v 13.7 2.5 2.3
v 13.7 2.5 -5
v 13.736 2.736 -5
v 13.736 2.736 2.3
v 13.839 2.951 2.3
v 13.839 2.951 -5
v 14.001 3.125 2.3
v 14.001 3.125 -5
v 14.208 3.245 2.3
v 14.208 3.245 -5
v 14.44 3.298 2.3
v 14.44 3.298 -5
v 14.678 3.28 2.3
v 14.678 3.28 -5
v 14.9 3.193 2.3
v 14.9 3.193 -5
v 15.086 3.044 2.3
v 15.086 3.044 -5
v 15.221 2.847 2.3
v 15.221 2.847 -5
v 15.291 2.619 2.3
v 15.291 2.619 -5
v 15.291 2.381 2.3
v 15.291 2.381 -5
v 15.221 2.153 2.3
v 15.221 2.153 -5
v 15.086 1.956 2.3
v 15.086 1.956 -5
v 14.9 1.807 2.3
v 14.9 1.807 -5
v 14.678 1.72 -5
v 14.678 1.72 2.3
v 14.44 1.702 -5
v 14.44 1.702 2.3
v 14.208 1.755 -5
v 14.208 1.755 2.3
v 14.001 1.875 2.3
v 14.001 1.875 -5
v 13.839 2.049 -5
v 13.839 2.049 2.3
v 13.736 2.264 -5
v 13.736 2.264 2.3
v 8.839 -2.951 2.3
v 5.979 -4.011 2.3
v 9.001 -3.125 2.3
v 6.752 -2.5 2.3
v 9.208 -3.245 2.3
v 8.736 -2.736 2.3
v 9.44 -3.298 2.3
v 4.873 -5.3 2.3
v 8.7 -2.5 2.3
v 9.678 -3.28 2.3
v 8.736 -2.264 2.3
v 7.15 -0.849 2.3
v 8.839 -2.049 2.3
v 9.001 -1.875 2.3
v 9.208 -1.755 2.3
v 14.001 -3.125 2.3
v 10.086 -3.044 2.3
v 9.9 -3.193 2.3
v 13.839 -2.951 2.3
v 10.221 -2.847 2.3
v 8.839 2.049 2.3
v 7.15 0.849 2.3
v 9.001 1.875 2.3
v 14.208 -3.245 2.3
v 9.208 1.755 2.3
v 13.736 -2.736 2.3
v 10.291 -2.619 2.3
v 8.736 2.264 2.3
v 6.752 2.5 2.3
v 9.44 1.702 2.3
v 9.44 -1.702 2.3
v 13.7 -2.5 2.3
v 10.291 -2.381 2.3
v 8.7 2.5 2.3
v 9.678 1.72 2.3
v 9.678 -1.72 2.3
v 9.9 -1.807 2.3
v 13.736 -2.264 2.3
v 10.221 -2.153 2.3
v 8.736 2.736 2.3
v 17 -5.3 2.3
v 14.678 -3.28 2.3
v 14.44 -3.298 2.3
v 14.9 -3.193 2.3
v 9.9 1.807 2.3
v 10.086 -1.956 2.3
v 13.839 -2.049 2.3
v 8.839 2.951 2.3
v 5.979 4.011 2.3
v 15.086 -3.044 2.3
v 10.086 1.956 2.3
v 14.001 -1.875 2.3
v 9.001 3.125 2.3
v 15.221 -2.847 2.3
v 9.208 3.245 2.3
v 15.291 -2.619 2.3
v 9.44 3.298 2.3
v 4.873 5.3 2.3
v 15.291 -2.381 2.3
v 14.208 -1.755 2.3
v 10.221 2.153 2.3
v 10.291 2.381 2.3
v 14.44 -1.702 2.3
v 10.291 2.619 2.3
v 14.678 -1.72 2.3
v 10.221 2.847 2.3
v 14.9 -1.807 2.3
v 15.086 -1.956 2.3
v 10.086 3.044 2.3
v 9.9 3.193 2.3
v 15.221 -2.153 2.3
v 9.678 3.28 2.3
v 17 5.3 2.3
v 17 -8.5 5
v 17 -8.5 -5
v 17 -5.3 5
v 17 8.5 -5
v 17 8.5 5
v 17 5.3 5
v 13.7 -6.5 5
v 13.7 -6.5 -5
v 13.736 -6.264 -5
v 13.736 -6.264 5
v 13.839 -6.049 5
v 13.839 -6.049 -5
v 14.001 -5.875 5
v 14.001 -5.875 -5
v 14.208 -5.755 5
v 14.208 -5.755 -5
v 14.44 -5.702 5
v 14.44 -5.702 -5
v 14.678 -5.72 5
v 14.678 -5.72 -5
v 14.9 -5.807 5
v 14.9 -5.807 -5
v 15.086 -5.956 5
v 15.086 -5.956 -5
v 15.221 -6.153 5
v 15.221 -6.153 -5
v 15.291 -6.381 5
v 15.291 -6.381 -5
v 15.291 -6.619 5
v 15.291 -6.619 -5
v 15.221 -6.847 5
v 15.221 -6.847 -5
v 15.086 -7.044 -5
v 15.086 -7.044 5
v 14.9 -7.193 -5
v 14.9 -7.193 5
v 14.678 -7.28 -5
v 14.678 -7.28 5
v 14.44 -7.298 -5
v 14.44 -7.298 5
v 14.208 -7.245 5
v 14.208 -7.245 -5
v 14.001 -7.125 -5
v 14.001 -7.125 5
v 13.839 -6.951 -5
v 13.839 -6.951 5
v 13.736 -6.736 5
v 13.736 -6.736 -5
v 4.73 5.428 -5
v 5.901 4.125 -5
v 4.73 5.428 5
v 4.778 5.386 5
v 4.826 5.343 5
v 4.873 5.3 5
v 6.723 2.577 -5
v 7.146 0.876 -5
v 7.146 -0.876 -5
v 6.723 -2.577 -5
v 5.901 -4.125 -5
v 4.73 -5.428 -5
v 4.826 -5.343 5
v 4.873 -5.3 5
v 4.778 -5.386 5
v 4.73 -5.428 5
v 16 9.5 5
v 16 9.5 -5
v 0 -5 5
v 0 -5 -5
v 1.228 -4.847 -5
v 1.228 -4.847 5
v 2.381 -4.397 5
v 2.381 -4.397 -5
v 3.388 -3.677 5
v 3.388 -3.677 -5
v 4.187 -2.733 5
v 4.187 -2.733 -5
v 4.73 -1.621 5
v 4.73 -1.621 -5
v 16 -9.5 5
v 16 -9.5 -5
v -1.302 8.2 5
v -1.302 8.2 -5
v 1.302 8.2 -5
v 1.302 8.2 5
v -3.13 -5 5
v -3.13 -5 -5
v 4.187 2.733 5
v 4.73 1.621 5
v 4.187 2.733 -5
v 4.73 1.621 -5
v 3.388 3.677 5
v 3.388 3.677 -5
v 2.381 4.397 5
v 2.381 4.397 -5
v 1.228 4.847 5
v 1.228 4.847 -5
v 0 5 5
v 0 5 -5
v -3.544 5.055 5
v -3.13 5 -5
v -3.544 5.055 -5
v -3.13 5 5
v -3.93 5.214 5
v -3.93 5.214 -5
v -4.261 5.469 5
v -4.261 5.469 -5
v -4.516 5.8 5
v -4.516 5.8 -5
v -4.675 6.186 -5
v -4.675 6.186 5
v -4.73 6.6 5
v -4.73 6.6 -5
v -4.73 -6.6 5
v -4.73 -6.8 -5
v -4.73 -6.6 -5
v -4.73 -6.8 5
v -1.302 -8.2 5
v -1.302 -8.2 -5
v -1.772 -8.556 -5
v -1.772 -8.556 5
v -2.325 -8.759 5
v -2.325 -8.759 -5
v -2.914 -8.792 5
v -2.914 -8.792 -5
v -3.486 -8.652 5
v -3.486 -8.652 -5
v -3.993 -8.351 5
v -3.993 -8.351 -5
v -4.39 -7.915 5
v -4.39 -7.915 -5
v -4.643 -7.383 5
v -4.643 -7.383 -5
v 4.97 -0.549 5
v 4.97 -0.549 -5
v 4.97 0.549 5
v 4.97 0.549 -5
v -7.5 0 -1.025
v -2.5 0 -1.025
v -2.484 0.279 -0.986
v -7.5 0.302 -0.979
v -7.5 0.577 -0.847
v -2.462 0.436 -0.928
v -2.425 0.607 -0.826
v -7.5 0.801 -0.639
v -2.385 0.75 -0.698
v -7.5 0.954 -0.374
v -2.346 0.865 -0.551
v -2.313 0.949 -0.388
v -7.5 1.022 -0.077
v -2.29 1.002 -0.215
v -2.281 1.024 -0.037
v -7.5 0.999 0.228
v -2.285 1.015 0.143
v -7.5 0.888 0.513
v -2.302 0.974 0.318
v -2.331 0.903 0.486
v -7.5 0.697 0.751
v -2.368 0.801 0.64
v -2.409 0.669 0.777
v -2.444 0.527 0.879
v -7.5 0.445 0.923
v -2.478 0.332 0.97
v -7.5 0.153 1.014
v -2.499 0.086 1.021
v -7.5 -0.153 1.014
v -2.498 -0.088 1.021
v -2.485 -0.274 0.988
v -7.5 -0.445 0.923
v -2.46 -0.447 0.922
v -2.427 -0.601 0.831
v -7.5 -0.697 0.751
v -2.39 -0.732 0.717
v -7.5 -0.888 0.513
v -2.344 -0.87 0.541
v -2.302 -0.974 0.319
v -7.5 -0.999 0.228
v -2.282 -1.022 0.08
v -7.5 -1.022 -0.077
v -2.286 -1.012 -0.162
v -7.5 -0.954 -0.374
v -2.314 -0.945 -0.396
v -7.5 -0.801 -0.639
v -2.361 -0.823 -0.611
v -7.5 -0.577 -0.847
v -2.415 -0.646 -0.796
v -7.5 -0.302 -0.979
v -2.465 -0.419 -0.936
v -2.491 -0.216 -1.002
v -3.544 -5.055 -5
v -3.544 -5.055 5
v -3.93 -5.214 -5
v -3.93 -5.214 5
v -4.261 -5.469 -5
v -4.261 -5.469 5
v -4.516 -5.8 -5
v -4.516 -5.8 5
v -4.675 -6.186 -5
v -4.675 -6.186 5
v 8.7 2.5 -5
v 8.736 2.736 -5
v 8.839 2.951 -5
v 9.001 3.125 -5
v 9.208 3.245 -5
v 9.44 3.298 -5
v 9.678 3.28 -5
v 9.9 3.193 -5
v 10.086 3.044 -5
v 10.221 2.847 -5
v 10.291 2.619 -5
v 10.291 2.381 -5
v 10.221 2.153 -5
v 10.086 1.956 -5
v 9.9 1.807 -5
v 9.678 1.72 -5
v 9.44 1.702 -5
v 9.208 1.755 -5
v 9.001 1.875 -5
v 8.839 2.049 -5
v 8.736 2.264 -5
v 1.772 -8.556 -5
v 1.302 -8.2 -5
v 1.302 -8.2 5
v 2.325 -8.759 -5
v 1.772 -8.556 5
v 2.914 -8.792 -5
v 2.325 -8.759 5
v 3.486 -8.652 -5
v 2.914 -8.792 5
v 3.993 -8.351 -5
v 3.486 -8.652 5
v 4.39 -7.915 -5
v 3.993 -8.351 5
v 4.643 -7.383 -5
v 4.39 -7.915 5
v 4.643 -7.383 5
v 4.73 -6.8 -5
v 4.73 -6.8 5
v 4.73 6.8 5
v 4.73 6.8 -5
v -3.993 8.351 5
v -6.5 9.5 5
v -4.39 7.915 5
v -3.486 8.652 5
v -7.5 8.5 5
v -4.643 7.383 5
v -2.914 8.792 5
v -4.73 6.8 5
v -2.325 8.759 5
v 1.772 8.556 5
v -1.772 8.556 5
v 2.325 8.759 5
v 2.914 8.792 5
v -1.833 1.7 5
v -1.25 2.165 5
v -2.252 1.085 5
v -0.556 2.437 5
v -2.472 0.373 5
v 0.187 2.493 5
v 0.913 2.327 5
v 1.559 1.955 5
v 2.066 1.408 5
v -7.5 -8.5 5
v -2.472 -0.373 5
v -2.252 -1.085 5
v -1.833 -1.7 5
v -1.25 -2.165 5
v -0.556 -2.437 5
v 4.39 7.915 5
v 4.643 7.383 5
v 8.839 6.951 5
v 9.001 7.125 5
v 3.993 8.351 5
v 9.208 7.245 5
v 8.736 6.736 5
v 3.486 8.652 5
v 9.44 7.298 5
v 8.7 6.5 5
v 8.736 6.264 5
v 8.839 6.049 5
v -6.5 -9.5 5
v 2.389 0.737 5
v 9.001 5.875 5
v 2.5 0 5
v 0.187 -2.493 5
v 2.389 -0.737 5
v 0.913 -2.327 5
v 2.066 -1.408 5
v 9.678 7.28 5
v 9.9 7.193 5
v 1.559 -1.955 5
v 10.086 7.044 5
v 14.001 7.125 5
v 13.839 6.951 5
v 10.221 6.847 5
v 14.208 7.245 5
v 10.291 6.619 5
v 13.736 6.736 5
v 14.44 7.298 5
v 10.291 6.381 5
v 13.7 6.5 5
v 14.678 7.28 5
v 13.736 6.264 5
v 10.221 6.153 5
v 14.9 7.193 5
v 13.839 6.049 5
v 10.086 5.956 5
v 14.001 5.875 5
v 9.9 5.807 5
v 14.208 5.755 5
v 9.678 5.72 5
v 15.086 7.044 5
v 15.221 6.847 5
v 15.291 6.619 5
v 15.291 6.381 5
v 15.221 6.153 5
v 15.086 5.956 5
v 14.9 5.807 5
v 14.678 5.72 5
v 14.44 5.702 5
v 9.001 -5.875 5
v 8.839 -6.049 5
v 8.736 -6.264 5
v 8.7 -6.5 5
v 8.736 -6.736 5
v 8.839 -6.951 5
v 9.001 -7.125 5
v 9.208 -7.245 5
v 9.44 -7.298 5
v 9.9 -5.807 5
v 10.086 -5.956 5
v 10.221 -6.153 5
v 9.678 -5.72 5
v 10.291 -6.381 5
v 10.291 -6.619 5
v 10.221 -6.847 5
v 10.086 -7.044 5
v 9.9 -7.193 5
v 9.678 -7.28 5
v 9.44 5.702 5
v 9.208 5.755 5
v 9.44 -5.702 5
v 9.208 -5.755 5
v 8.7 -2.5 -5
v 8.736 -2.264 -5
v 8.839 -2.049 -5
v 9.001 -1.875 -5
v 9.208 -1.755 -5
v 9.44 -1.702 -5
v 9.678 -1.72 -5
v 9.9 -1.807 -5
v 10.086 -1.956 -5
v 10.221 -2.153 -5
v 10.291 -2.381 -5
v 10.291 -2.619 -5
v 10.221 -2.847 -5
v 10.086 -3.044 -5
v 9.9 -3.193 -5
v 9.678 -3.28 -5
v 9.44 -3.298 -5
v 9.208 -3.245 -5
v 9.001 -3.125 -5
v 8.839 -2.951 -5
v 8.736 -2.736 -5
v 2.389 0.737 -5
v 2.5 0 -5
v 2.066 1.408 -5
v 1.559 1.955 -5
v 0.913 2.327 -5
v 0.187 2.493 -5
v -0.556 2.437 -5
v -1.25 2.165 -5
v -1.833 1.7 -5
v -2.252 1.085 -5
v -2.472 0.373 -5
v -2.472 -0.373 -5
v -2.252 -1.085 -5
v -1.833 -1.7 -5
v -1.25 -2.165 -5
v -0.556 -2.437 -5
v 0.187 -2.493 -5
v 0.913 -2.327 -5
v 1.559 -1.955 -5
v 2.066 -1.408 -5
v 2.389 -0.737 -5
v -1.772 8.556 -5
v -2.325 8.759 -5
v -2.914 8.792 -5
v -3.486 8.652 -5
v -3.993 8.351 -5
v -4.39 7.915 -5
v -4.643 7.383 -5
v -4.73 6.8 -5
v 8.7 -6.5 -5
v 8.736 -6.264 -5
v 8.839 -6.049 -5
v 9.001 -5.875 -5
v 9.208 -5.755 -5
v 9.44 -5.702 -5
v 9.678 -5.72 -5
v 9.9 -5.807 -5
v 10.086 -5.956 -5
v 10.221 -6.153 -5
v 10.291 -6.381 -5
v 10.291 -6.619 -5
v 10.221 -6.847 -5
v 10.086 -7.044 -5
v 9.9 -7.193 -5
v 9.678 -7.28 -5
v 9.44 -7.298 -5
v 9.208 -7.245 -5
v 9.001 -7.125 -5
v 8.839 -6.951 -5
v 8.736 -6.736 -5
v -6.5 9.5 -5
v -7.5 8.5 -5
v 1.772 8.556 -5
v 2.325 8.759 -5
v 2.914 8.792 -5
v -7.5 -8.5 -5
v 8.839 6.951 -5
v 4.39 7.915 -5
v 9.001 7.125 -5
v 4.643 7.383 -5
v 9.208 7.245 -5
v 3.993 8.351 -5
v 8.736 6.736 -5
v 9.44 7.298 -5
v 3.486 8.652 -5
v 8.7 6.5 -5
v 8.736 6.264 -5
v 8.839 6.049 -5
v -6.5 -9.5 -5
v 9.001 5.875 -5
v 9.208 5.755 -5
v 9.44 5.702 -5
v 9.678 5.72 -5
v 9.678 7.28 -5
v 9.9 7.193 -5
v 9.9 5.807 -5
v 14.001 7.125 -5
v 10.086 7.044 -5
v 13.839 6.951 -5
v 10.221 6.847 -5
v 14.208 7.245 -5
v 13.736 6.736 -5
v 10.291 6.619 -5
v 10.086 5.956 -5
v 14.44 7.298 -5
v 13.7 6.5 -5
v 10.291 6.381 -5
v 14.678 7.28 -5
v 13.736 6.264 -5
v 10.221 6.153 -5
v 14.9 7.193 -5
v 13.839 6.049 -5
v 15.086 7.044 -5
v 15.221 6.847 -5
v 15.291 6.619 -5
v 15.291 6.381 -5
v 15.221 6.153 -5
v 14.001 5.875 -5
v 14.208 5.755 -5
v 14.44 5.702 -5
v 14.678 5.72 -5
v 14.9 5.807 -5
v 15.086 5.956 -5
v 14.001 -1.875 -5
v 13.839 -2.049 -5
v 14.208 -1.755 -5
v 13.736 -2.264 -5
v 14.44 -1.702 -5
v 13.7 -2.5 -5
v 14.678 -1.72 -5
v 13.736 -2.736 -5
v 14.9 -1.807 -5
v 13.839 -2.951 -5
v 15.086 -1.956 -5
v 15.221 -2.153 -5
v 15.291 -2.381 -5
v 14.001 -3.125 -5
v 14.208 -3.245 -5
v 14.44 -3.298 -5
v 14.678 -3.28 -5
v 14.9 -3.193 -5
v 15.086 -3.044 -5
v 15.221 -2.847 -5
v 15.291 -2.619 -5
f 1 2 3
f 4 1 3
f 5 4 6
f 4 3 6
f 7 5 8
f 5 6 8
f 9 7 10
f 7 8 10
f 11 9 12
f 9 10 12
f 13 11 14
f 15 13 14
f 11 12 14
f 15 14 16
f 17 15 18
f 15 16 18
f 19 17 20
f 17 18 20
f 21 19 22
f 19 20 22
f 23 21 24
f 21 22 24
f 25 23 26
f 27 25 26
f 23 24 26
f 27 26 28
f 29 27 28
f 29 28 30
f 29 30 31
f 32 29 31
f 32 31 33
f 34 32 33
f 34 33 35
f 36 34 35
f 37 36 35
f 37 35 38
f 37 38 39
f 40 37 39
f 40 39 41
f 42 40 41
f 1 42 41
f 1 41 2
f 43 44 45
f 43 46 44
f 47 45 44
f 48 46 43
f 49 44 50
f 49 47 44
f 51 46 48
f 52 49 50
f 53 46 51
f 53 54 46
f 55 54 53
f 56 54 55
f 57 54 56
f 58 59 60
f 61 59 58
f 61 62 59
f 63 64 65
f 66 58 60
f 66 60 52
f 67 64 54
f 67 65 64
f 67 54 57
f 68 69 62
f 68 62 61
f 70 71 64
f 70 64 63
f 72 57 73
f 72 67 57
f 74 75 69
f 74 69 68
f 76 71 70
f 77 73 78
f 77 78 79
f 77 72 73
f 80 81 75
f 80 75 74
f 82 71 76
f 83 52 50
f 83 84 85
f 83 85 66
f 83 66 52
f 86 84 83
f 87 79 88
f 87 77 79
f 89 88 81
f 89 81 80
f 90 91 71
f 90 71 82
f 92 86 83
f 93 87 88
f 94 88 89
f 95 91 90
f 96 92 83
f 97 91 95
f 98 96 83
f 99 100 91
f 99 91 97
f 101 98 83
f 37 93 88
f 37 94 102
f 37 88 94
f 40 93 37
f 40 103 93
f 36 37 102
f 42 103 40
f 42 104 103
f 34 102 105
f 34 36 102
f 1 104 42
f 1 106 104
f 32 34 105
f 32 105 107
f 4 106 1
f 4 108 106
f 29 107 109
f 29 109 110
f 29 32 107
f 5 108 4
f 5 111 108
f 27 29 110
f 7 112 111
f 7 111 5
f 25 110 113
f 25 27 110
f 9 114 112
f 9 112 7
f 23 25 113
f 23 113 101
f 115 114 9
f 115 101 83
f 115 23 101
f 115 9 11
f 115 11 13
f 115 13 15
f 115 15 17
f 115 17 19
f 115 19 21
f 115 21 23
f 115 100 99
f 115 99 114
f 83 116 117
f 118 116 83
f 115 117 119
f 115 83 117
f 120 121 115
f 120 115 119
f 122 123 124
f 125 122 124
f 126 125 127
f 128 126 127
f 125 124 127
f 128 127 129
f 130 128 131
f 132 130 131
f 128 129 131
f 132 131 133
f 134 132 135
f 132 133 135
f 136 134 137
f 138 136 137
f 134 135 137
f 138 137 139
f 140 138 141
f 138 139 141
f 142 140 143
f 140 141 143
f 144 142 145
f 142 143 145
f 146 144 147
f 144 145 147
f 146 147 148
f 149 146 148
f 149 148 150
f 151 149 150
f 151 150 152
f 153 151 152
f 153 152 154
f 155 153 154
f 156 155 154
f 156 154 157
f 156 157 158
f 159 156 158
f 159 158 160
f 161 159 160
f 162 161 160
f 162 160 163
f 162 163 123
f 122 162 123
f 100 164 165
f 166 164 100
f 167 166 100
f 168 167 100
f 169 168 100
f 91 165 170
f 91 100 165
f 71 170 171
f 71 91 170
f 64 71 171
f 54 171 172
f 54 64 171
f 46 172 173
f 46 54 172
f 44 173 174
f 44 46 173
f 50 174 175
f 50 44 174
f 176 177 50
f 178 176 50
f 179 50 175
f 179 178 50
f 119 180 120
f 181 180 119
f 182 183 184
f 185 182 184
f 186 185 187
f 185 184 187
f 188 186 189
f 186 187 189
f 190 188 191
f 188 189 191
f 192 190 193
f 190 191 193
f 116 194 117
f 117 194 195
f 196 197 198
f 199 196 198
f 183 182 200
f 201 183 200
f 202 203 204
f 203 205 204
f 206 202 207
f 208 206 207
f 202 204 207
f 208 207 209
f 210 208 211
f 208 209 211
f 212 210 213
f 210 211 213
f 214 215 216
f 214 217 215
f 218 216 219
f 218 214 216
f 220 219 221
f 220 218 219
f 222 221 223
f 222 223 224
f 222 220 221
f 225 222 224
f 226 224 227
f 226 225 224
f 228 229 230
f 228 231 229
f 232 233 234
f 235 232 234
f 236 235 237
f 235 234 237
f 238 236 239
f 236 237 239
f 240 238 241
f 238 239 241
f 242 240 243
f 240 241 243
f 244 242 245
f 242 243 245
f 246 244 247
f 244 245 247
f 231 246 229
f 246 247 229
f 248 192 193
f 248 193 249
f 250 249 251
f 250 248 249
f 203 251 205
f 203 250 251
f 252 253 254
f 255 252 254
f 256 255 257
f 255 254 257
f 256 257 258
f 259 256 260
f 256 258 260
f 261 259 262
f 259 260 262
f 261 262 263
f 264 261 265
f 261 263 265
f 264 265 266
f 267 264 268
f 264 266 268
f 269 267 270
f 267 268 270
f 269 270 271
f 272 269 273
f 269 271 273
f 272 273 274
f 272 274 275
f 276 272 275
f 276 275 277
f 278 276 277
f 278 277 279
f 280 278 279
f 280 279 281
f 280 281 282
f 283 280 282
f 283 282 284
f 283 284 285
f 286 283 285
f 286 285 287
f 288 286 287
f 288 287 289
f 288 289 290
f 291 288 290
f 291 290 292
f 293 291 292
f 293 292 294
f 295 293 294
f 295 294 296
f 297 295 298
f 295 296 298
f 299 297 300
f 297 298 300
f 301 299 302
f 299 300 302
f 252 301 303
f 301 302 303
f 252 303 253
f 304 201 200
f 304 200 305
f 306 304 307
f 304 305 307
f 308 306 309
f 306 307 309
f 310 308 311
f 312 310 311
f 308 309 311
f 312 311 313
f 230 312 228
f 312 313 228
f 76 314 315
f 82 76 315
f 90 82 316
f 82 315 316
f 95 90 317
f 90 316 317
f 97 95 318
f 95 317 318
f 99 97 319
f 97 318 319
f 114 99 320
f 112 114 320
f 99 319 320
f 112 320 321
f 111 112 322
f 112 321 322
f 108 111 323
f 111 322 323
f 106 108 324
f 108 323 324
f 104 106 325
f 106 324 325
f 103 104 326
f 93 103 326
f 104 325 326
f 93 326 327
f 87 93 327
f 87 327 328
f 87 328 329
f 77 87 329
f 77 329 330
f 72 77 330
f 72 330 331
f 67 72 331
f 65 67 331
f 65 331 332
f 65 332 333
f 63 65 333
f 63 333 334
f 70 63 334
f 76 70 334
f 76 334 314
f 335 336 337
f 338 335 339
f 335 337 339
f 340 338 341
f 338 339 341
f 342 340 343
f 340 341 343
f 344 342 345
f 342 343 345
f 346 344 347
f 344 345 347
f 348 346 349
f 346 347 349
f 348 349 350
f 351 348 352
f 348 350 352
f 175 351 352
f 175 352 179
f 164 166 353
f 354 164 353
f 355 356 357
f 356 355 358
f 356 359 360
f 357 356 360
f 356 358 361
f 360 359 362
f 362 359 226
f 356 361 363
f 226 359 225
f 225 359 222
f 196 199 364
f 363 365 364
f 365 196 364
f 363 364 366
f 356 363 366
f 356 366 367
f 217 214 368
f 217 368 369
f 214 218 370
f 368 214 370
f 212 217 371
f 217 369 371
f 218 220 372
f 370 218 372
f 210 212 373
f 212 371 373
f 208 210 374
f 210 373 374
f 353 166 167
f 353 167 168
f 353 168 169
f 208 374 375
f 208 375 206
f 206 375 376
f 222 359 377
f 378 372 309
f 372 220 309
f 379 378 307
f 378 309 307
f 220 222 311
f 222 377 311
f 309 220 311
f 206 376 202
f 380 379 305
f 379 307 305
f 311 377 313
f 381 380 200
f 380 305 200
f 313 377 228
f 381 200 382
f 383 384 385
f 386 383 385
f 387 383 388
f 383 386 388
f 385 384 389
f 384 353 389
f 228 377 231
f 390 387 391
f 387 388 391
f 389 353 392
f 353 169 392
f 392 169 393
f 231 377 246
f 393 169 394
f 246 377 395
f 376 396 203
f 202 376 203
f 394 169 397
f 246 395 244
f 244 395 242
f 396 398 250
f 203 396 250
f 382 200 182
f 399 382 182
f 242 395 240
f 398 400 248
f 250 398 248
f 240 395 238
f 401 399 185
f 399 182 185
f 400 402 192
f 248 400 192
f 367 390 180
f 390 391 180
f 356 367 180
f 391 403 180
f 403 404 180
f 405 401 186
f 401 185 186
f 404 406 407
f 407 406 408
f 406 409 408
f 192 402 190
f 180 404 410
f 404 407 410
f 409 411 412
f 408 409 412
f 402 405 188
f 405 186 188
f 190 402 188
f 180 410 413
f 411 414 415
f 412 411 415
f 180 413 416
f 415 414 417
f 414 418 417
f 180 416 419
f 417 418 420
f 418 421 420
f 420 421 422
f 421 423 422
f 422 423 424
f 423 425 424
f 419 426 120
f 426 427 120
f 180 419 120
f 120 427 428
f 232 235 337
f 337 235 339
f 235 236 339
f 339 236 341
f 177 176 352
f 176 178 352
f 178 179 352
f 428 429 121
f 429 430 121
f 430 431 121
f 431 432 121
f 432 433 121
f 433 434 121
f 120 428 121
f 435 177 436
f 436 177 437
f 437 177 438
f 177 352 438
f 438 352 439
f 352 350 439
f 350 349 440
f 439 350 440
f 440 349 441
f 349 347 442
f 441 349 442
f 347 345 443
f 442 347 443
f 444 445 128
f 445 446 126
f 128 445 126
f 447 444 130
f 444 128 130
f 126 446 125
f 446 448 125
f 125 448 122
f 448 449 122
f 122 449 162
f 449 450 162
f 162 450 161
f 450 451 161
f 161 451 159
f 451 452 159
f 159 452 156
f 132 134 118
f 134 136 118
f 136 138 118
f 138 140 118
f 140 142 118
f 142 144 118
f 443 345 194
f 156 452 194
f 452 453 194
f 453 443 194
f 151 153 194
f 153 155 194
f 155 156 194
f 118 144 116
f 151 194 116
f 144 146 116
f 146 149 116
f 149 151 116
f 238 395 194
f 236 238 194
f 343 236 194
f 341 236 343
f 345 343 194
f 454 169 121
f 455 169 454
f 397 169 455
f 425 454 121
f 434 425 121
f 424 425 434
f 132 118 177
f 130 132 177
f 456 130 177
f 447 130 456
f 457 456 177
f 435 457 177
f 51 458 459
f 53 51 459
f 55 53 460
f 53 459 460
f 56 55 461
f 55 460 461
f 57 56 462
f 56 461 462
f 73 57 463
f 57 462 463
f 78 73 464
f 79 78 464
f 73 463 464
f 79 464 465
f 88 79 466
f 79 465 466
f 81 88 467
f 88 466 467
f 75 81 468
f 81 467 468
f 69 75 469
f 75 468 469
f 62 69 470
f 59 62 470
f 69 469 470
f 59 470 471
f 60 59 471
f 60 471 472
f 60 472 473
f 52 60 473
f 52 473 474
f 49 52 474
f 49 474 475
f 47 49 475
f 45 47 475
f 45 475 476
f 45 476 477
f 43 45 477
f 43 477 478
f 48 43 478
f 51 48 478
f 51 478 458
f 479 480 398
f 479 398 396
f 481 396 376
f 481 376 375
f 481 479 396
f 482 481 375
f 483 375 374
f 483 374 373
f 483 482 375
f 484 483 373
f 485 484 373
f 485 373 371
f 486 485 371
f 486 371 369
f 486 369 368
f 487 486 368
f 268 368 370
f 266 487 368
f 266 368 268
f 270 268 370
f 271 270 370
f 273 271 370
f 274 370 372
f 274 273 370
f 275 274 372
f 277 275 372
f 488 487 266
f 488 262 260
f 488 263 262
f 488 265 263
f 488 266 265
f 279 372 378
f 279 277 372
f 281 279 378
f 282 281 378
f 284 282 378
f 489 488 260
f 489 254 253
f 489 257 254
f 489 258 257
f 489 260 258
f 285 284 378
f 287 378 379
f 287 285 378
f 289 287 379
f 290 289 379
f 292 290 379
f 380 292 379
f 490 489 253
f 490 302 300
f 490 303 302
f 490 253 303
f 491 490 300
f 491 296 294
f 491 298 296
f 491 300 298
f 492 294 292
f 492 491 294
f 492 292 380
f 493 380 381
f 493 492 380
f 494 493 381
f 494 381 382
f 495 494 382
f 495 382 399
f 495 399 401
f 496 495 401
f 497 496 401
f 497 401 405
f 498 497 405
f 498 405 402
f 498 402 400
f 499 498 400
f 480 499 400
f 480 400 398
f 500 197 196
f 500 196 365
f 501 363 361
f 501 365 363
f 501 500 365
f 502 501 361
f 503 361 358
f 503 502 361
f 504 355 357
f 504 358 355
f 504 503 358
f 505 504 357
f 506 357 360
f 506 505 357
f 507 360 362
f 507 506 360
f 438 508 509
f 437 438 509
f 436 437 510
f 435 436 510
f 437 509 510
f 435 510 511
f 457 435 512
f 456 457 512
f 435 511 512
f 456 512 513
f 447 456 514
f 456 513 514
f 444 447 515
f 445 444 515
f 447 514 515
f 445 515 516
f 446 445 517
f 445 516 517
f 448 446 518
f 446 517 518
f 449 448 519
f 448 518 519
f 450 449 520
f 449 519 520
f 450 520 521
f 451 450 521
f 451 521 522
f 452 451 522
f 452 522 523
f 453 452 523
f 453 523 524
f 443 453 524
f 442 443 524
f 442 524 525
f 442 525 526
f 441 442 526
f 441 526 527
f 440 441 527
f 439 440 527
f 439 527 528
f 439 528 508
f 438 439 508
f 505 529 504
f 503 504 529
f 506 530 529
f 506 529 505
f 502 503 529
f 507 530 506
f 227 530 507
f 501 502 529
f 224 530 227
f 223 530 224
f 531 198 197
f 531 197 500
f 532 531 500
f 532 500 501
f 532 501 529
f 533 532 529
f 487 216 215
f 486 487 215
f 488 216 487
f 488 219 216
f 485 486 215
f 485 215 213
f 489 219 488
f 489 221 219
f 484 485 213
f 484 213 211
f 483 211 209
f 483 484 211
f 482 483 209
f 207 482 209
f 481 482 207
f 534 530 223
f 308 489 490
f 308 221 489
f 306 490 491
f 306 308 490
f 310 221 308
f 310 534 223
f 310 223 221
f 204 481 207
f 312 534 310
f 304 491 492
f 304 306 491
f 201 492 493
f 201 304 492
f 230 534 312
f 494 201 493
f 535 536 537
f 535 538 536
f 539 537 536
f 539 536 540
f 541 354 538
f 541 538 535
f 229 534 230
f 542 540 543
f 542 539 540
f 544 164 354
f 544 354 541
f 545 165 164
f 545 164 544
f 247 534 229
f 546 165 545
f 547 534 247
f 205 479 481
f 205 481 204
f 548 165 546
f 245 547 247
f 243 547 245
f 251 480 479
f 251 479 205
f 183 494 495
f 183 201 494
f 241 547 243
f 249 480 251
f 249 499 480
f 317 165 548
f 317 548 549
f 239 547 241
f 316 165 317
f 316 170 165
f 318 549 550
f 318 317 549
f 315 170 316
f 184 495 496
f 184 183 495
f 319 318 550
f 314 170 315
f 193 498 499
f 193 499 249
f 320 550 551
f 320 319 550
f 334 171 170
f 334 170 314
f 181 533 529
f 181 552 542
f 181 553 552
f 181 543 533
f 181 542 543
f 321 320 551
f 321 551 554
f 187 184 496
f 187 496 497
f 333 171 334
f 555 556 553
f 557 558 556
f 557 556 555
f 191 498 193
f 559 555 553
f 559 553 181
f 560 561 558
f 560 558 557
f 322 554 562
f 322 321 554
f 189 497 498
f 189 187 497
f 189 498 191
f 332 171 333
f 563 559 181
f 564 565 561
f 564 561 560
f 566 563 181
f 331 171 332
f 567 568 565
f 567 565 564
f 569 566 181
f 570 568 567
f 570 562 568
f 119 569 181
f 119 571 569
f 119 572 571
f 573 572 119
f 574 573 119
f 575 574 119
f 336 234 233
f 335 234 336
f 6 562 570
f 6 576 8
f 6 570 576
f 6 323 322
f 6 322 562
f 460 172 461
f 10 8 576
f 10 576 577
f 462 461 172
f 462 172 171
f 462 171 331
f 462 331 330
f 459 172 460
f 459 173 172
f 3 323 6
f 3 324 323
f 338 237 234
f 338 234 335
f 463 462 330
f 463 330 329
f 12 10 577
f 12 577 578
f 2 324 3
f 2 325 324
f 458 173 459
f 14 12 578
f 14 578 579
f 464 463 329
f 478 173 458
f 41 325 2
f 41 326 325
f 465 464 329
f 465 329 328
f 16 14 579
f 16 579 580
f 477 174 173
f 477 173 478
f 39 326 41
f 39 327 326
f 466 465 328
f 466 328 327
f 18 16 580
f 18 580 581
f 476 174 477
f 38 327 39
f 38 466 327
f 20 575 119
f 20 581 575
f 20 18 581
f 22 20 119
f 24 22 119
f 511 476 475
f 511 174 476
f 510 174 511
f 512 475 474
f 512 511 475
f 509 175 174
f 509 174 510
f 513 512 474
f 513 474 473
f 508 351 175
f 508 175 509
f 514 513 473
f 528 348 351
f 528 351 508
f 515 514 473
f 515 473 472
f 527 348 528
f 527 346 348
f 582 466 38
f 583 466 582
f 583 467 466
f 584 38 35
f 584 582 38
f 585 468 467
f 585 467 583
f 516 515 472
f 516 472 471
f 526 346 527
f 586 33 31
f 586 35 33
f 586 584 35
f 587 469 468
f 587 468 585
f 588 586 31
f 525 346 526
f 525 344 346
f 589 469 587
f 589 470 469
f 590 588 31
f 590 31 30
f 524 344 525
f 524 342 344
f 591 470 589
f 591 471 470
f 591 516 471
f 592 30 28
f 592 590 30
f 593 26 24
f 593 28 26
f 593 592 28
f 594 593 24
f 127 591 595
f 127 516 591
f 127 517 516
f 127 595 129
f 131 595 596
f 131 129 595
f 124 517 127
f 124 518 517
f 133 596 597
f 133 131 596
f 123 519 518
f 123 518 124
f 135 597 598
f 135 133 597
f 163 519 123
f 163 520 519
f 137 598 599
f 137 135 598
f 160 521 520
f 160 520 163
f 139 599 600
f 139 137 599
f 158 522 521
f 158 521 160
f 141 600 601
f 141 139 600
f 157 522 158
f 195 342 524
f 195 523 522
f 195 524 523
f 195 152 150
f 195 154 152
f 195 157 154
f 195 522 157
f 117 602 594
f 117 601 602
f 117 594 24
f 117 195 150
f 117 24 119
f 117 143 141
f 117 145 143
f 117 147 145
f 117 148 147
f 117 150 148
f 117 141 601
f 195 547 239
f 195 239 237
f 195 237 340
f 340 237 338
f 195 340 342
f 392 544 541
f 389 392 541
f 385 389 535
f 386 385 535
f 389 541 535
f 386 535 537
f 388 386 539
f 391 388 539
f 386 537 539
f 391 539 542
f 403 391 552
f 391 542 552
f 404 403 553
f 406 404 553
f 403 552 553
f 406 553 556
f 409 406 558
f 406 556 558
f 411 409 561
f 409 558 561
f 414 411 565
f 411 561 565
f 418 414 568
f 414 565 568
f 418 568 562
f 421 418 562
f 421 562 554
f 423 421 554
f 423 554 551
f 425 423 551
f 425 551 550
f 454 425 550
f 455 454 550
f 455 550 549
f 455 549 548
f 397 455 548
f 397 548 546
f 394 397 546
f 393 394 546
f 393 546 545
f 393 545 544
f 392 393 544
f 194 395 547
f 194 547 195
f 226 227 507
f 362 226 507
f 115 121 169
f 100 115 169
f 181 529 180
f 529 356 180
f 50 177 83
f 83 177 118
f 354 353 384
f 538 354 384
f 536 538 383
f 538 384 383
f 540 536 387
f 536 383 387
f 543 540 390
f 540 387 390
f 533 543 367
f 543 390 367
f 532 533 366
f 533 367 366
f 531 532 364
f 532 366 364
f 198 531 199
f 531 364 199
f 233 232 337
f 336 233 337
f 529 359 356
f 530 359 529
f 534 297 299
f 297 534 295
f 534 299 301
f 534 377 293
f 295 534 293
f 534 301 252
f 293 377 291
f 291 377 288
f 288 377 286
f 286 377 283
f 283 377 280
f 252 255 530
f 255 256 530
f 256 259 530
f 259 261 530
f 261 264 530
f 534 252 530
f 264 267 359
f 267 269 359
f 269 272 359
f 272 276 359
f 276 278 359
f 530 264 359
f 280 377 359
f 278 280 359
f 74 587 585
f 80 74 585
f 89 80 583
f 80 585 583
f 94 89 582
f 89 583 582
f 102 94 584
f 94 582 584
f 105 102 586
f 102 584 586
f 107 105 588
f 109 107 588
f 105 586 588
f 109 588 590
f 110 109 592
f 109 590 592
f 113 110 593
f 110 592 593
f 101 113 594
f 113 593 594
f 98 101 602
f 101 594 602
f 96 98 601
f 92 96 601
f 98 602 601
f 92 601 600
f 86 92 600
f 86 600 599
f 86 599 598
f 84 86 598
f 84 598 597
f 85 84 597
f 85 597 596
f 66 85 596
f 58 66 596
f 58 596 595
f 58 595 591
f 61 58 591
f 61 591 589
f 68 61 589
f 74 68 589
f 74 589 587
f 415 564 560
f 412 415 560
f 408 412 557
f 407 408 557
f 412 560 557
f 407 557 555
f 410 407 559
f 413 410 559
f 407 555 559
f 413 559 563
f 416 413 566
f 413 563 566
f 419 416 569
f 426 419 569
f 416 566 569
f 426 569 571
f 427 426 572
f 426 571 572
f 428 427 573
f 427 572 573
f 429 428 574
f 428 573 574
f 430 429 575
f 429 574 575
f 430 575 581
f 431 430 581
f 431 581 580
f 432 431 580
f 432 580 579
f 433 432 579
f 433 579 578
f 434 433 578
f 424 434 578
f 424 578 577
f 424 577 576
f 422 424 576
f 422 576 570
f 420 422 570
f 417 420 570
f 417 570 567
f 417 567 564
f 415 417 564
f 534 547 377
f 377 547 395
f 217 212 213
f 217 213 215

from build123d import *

# Parameters (mm, degrees)
SKETCH1_W                = 15
SKETCH1_H                = 19
BOSS_EXTRUDE1_DEPTH      = 5
BOSS_EXTRUDE1_DEPTH_BACK = 5
CUT_EXTRUDE1_START       = -6
SKETCH2_R                = 2
CUT_EXTRUDE1_DEPTH       = 16
SKETCH5_R                = 2
CUT_EXTRUDE4_DEPTH       = 17
CUT_EXTRUDE4_DEPTH_BACK  = 17
SKETCH6_R                = 2
CUT_EXTRUDE5_DEPTH       = 17
CUT_EXTRUDE5_DEPTH_BACK  = 17
SKETCH10_W               = 9.46
SKETCH10_H               = 13.6
CUT_EXTRUDE6_DEPTH       = 6
CUT_EXTRUDE6_DEPTH_BACK  = 6
BOSS_EXTRUDE2_START      = -5
SKETCH7_R                = 5
SKETCH7_R_2              = 2.5
BOSS_EXTRUDE2_DEPTH      = 10
BOSS_EXTRUDE3_DEPTH      = 5
FILLET1_R                = 1.6
SKETCH11_W               = 12.27
SKETCH11_H               = 19
BOSS_EXTRUDE4_DEPTH      = 10
CHAMFER1_SIZE            = 1
SKETCH16_W               = 5.80562201
SKETCH16_H               = 3.2
CUT_EXTRUDE8_DEPTH       = 11.5
CUT_EXTRUDE9_DEPTH       = 11.5
CUT_EXTRUDE10_DEPTH      = 2.7
TROU_TARAUD_M21_D        = 1.6
TROU_TARAUD_M2_51_D      = 2.05
TROU_TARAUD_M2_51_DEPTH  = 8.25
TROU_TARAUD_M2_51_TIP    = 0.615882135


with BuildPart() as part:
    # Sketch1 → Boss-Extrude1 (new body, two sides)
    with BuildSketch(Plane.XY) as boss_extrude1_sk:
        Rectangle(SKETCH1_W, SKETCH1_H)
    extrude(amount=BOSS_EXTRUDE1_DEPTH)
    extrude(boss_extrude1_sk.sketch, amount=-BOSS_EXTRUDE1_DEPTH_BACK)

    # Sketch2 → Cut-Extrude1 (cut)
    with BuildSketch(Plane.XY.offset(CUT_EXTRUDE1_START)):
        with Locations((-2.73, 6.8)):
            Circle(SKETCH2_R)
    cut_extrude1 = extrude(amount=CUT_EXTRUDE1_DEPTH, mode=Mode.SUBTRACT)

    # Mirror3: Cut-Extrude1 across plane
    add(cut_extrude1.mirror(Plane.ZX), mode=Mode.SUBTRACT)

    # Sketch5 → Cut-Extrude4 (cut, two sides)
    with BuildSketch(Plane.XY) as cut_extrude4_sk:
        with Locations((2.73, 6.8)):
            Circle(SKETCH5_R)
    extrude(amount=CUT_EXTRUDE4_DEPTH, mode=Mode.SUBTRACT)
    extrude(cut_extrude4_sk.sketch, amount=-CUT_EXTRUDE4_DEPTH_BACK, mode=Mode.SUBTRACT)

    # Sketch6 → Cut-Extrude5 (cut, two sides)
    with BuildSketch(Plane.XY) as cut_extrude5_sk:
        with Locations((2.73, -6.8)):
            Circle(SKETCH6_R)
    extrude(amount=CUT_EXTRUDE5_DEPTH, mode=Mode.SUBTRACT)
    extrude(cut_extrude5_sk.sketch, amount=-CUT_EXTRUDE5_DEPTH_BACK, mode=Mode.SUBTRACT)

    # Sketch10 → Cut-Extrude6 (cut, two sides)
    with BuildSketch(Plane.XY) as cut_extrude6_sk:
        Rectangle(SKETCH10_W, SKETCH10_H)
    extrude(amount=CUT_EXTRUDE6_DEPTH, mode=Mode.SUBTRACT)
    extrude(cut_extrude6_sk.sketch, amount=-CUT_EXTRUDE6_DEPTH_BACK, mode=Mode.SUBTRACT)



with BuildPart() as body_2:
    # Sketch7 → Boss-Extrude2 (new body)
    with BuildSketch(Plane.XY.offset(BOSS_EXTRUDE2_START)):
        Circle(SKETCH7_R)
        Circle(SKETCH7_R_2, mode=Mode.SUBTRACT)
    extrude(amount=BOSS_EXTRUDE2_DEPTH)


with BuildPart() as part_1:
    add(part.part)

    add(body_2.part)  # Boss-Extrude3 merges body 2
    # Sketch8 → Boss-Extrude3 (add, symmetric)
    with BuildSketch(Plane.XY):
        Polygon((0, 5), (-7.5, 5), (-7.5, 0), (-5, 0), align=None)
    boss_extrude3 = extrude(amount=BOSS_EXTRUDE3_DEPTH, both=True)

    # Mirror7: Boss-Extrude3 across plane
    add(boss_extrude3.mirror(Plane.ZX))

    # Fillet1
    fillet1_edges = [part_1.edges().sort_by_distance(p)[0] for p in [
        (-4.73, -5, 0),
        (-4.73, 5, 0),
    ]]
    fillet(fillet1_edges, radius=FILLET1_R)

    # Sketch11 → Boss-Extrude4 (add)
    with BuildSketch(Plane.XY.offset(5)):
        with Locations((10.865, 0)):
            Rectangle(SKETCH11_W, SKETCH11_H)
    extrude(amount=-BOSS_EXTRUDE4_DEPTH)

    # Chamfer1
    chamfer1_edges = [part_1.edges().sort_by_distance(p)[0] for p in [
        (17, 9.5, 0),
        (17, -9.5, 0),
        (-7.5, 9.5, 0),
        (-7.5, -9.5, 0),
    ]]
    chamfer(chamfer1_edges, length=CHAMFER1_SIZE)

    # Sketch16 → Cut-Extrude8 (cut)
    with BuildSketch(Plane.XY.offset(5)):
        with Locations((-0.227188995, 6.6)):
            Rectangle(SKETCH16_W, SKETCH16_H)
    cut_extrude8 = extrude(amount=-CUT_EXTRUDE8_DEPTH, mode=Mode.SUBTRACT)

    # Mirror8: Cut-Extrude8 across plane
    add(cut_extrude8.mirror(Plane.ZX), mode=Mode.SUBTRACT)

    # Sketch17 → Cut-Extrude9 (cut)
    with BuildSketch(Plane.XY.offset(5)):
        with BuildLine():
            ThreePointArc((2.678170763, -4.222250746), (5, 0), (2.678170763, 4.222250746))
            ThreePointArc((2.678170763, 4.222250746), (2.338473166, 5.740343478), (3.856565898, 6.080041075))
            ThreePointArc((3.856565898, 6.080041075), (7.2, 0), (3.856565898, -6.080041075))
            ThreePointArc((3.856565898, -6.080041075), (2.338473166, -5.740343478), (2.678170763, -4.222250746))
        make_face()
    extrude(amount=-CUT_EXTRUDE9_DEPTH, mode=Mode.SUBTRACT)

    # Sketch20 → Cut-Extrude10 (cut)
    with BuildSketch(Plane.XY.offset(5)):
        with BuildLine():
            Line((17, 5.3), (4.73, 5.3))
            ThreePointArc((4.73, 5.3), (7.103724375, 0), (4.73, -5.3))
            Line((4.73, -5.3), (17, -5.3))
            Line((17, -5.3), (17, 5.3))
        make_face()
    extrude(amount=-CUT_EXTRUDE10_DEPTH, mode=Mode.SUBTRACT)

    # Trou taraudé M21 (through all)
    with Locations(Plane.XY.offset(5)):
        with Locations((14.5, 2.5), (14.5, -2.5), (9.5, 2.5), (9.5, -2.5), (9.5, 6.5), (14.5, 6.5), (9.5, -6.5), (14.5, -6.5)):
            Hole(TROU_TARAUD_M21_D / 2)

    # Trou taraudé M2.51
    with Locations(Plane.ZY.offset(7.5)):
        with Locations((0, 0)):
            Hole(TROU_TARAUD_M2_51_D / 2, depth=TROU_TARAUD_M2_51_DEPTH)
            with Locations((0, 0, -(TROU_TARAUD_M2_51_DEPTH + TROU_TARAUD_M2_51_TIP / 2))):  # 118° drill point
                Cone(0, TROU_TARAUD_M2_51_D / 2, TROU_TARAUD_M2_51_TIP, mode=Mode.SUBTRACT)


solid = part_1.part
